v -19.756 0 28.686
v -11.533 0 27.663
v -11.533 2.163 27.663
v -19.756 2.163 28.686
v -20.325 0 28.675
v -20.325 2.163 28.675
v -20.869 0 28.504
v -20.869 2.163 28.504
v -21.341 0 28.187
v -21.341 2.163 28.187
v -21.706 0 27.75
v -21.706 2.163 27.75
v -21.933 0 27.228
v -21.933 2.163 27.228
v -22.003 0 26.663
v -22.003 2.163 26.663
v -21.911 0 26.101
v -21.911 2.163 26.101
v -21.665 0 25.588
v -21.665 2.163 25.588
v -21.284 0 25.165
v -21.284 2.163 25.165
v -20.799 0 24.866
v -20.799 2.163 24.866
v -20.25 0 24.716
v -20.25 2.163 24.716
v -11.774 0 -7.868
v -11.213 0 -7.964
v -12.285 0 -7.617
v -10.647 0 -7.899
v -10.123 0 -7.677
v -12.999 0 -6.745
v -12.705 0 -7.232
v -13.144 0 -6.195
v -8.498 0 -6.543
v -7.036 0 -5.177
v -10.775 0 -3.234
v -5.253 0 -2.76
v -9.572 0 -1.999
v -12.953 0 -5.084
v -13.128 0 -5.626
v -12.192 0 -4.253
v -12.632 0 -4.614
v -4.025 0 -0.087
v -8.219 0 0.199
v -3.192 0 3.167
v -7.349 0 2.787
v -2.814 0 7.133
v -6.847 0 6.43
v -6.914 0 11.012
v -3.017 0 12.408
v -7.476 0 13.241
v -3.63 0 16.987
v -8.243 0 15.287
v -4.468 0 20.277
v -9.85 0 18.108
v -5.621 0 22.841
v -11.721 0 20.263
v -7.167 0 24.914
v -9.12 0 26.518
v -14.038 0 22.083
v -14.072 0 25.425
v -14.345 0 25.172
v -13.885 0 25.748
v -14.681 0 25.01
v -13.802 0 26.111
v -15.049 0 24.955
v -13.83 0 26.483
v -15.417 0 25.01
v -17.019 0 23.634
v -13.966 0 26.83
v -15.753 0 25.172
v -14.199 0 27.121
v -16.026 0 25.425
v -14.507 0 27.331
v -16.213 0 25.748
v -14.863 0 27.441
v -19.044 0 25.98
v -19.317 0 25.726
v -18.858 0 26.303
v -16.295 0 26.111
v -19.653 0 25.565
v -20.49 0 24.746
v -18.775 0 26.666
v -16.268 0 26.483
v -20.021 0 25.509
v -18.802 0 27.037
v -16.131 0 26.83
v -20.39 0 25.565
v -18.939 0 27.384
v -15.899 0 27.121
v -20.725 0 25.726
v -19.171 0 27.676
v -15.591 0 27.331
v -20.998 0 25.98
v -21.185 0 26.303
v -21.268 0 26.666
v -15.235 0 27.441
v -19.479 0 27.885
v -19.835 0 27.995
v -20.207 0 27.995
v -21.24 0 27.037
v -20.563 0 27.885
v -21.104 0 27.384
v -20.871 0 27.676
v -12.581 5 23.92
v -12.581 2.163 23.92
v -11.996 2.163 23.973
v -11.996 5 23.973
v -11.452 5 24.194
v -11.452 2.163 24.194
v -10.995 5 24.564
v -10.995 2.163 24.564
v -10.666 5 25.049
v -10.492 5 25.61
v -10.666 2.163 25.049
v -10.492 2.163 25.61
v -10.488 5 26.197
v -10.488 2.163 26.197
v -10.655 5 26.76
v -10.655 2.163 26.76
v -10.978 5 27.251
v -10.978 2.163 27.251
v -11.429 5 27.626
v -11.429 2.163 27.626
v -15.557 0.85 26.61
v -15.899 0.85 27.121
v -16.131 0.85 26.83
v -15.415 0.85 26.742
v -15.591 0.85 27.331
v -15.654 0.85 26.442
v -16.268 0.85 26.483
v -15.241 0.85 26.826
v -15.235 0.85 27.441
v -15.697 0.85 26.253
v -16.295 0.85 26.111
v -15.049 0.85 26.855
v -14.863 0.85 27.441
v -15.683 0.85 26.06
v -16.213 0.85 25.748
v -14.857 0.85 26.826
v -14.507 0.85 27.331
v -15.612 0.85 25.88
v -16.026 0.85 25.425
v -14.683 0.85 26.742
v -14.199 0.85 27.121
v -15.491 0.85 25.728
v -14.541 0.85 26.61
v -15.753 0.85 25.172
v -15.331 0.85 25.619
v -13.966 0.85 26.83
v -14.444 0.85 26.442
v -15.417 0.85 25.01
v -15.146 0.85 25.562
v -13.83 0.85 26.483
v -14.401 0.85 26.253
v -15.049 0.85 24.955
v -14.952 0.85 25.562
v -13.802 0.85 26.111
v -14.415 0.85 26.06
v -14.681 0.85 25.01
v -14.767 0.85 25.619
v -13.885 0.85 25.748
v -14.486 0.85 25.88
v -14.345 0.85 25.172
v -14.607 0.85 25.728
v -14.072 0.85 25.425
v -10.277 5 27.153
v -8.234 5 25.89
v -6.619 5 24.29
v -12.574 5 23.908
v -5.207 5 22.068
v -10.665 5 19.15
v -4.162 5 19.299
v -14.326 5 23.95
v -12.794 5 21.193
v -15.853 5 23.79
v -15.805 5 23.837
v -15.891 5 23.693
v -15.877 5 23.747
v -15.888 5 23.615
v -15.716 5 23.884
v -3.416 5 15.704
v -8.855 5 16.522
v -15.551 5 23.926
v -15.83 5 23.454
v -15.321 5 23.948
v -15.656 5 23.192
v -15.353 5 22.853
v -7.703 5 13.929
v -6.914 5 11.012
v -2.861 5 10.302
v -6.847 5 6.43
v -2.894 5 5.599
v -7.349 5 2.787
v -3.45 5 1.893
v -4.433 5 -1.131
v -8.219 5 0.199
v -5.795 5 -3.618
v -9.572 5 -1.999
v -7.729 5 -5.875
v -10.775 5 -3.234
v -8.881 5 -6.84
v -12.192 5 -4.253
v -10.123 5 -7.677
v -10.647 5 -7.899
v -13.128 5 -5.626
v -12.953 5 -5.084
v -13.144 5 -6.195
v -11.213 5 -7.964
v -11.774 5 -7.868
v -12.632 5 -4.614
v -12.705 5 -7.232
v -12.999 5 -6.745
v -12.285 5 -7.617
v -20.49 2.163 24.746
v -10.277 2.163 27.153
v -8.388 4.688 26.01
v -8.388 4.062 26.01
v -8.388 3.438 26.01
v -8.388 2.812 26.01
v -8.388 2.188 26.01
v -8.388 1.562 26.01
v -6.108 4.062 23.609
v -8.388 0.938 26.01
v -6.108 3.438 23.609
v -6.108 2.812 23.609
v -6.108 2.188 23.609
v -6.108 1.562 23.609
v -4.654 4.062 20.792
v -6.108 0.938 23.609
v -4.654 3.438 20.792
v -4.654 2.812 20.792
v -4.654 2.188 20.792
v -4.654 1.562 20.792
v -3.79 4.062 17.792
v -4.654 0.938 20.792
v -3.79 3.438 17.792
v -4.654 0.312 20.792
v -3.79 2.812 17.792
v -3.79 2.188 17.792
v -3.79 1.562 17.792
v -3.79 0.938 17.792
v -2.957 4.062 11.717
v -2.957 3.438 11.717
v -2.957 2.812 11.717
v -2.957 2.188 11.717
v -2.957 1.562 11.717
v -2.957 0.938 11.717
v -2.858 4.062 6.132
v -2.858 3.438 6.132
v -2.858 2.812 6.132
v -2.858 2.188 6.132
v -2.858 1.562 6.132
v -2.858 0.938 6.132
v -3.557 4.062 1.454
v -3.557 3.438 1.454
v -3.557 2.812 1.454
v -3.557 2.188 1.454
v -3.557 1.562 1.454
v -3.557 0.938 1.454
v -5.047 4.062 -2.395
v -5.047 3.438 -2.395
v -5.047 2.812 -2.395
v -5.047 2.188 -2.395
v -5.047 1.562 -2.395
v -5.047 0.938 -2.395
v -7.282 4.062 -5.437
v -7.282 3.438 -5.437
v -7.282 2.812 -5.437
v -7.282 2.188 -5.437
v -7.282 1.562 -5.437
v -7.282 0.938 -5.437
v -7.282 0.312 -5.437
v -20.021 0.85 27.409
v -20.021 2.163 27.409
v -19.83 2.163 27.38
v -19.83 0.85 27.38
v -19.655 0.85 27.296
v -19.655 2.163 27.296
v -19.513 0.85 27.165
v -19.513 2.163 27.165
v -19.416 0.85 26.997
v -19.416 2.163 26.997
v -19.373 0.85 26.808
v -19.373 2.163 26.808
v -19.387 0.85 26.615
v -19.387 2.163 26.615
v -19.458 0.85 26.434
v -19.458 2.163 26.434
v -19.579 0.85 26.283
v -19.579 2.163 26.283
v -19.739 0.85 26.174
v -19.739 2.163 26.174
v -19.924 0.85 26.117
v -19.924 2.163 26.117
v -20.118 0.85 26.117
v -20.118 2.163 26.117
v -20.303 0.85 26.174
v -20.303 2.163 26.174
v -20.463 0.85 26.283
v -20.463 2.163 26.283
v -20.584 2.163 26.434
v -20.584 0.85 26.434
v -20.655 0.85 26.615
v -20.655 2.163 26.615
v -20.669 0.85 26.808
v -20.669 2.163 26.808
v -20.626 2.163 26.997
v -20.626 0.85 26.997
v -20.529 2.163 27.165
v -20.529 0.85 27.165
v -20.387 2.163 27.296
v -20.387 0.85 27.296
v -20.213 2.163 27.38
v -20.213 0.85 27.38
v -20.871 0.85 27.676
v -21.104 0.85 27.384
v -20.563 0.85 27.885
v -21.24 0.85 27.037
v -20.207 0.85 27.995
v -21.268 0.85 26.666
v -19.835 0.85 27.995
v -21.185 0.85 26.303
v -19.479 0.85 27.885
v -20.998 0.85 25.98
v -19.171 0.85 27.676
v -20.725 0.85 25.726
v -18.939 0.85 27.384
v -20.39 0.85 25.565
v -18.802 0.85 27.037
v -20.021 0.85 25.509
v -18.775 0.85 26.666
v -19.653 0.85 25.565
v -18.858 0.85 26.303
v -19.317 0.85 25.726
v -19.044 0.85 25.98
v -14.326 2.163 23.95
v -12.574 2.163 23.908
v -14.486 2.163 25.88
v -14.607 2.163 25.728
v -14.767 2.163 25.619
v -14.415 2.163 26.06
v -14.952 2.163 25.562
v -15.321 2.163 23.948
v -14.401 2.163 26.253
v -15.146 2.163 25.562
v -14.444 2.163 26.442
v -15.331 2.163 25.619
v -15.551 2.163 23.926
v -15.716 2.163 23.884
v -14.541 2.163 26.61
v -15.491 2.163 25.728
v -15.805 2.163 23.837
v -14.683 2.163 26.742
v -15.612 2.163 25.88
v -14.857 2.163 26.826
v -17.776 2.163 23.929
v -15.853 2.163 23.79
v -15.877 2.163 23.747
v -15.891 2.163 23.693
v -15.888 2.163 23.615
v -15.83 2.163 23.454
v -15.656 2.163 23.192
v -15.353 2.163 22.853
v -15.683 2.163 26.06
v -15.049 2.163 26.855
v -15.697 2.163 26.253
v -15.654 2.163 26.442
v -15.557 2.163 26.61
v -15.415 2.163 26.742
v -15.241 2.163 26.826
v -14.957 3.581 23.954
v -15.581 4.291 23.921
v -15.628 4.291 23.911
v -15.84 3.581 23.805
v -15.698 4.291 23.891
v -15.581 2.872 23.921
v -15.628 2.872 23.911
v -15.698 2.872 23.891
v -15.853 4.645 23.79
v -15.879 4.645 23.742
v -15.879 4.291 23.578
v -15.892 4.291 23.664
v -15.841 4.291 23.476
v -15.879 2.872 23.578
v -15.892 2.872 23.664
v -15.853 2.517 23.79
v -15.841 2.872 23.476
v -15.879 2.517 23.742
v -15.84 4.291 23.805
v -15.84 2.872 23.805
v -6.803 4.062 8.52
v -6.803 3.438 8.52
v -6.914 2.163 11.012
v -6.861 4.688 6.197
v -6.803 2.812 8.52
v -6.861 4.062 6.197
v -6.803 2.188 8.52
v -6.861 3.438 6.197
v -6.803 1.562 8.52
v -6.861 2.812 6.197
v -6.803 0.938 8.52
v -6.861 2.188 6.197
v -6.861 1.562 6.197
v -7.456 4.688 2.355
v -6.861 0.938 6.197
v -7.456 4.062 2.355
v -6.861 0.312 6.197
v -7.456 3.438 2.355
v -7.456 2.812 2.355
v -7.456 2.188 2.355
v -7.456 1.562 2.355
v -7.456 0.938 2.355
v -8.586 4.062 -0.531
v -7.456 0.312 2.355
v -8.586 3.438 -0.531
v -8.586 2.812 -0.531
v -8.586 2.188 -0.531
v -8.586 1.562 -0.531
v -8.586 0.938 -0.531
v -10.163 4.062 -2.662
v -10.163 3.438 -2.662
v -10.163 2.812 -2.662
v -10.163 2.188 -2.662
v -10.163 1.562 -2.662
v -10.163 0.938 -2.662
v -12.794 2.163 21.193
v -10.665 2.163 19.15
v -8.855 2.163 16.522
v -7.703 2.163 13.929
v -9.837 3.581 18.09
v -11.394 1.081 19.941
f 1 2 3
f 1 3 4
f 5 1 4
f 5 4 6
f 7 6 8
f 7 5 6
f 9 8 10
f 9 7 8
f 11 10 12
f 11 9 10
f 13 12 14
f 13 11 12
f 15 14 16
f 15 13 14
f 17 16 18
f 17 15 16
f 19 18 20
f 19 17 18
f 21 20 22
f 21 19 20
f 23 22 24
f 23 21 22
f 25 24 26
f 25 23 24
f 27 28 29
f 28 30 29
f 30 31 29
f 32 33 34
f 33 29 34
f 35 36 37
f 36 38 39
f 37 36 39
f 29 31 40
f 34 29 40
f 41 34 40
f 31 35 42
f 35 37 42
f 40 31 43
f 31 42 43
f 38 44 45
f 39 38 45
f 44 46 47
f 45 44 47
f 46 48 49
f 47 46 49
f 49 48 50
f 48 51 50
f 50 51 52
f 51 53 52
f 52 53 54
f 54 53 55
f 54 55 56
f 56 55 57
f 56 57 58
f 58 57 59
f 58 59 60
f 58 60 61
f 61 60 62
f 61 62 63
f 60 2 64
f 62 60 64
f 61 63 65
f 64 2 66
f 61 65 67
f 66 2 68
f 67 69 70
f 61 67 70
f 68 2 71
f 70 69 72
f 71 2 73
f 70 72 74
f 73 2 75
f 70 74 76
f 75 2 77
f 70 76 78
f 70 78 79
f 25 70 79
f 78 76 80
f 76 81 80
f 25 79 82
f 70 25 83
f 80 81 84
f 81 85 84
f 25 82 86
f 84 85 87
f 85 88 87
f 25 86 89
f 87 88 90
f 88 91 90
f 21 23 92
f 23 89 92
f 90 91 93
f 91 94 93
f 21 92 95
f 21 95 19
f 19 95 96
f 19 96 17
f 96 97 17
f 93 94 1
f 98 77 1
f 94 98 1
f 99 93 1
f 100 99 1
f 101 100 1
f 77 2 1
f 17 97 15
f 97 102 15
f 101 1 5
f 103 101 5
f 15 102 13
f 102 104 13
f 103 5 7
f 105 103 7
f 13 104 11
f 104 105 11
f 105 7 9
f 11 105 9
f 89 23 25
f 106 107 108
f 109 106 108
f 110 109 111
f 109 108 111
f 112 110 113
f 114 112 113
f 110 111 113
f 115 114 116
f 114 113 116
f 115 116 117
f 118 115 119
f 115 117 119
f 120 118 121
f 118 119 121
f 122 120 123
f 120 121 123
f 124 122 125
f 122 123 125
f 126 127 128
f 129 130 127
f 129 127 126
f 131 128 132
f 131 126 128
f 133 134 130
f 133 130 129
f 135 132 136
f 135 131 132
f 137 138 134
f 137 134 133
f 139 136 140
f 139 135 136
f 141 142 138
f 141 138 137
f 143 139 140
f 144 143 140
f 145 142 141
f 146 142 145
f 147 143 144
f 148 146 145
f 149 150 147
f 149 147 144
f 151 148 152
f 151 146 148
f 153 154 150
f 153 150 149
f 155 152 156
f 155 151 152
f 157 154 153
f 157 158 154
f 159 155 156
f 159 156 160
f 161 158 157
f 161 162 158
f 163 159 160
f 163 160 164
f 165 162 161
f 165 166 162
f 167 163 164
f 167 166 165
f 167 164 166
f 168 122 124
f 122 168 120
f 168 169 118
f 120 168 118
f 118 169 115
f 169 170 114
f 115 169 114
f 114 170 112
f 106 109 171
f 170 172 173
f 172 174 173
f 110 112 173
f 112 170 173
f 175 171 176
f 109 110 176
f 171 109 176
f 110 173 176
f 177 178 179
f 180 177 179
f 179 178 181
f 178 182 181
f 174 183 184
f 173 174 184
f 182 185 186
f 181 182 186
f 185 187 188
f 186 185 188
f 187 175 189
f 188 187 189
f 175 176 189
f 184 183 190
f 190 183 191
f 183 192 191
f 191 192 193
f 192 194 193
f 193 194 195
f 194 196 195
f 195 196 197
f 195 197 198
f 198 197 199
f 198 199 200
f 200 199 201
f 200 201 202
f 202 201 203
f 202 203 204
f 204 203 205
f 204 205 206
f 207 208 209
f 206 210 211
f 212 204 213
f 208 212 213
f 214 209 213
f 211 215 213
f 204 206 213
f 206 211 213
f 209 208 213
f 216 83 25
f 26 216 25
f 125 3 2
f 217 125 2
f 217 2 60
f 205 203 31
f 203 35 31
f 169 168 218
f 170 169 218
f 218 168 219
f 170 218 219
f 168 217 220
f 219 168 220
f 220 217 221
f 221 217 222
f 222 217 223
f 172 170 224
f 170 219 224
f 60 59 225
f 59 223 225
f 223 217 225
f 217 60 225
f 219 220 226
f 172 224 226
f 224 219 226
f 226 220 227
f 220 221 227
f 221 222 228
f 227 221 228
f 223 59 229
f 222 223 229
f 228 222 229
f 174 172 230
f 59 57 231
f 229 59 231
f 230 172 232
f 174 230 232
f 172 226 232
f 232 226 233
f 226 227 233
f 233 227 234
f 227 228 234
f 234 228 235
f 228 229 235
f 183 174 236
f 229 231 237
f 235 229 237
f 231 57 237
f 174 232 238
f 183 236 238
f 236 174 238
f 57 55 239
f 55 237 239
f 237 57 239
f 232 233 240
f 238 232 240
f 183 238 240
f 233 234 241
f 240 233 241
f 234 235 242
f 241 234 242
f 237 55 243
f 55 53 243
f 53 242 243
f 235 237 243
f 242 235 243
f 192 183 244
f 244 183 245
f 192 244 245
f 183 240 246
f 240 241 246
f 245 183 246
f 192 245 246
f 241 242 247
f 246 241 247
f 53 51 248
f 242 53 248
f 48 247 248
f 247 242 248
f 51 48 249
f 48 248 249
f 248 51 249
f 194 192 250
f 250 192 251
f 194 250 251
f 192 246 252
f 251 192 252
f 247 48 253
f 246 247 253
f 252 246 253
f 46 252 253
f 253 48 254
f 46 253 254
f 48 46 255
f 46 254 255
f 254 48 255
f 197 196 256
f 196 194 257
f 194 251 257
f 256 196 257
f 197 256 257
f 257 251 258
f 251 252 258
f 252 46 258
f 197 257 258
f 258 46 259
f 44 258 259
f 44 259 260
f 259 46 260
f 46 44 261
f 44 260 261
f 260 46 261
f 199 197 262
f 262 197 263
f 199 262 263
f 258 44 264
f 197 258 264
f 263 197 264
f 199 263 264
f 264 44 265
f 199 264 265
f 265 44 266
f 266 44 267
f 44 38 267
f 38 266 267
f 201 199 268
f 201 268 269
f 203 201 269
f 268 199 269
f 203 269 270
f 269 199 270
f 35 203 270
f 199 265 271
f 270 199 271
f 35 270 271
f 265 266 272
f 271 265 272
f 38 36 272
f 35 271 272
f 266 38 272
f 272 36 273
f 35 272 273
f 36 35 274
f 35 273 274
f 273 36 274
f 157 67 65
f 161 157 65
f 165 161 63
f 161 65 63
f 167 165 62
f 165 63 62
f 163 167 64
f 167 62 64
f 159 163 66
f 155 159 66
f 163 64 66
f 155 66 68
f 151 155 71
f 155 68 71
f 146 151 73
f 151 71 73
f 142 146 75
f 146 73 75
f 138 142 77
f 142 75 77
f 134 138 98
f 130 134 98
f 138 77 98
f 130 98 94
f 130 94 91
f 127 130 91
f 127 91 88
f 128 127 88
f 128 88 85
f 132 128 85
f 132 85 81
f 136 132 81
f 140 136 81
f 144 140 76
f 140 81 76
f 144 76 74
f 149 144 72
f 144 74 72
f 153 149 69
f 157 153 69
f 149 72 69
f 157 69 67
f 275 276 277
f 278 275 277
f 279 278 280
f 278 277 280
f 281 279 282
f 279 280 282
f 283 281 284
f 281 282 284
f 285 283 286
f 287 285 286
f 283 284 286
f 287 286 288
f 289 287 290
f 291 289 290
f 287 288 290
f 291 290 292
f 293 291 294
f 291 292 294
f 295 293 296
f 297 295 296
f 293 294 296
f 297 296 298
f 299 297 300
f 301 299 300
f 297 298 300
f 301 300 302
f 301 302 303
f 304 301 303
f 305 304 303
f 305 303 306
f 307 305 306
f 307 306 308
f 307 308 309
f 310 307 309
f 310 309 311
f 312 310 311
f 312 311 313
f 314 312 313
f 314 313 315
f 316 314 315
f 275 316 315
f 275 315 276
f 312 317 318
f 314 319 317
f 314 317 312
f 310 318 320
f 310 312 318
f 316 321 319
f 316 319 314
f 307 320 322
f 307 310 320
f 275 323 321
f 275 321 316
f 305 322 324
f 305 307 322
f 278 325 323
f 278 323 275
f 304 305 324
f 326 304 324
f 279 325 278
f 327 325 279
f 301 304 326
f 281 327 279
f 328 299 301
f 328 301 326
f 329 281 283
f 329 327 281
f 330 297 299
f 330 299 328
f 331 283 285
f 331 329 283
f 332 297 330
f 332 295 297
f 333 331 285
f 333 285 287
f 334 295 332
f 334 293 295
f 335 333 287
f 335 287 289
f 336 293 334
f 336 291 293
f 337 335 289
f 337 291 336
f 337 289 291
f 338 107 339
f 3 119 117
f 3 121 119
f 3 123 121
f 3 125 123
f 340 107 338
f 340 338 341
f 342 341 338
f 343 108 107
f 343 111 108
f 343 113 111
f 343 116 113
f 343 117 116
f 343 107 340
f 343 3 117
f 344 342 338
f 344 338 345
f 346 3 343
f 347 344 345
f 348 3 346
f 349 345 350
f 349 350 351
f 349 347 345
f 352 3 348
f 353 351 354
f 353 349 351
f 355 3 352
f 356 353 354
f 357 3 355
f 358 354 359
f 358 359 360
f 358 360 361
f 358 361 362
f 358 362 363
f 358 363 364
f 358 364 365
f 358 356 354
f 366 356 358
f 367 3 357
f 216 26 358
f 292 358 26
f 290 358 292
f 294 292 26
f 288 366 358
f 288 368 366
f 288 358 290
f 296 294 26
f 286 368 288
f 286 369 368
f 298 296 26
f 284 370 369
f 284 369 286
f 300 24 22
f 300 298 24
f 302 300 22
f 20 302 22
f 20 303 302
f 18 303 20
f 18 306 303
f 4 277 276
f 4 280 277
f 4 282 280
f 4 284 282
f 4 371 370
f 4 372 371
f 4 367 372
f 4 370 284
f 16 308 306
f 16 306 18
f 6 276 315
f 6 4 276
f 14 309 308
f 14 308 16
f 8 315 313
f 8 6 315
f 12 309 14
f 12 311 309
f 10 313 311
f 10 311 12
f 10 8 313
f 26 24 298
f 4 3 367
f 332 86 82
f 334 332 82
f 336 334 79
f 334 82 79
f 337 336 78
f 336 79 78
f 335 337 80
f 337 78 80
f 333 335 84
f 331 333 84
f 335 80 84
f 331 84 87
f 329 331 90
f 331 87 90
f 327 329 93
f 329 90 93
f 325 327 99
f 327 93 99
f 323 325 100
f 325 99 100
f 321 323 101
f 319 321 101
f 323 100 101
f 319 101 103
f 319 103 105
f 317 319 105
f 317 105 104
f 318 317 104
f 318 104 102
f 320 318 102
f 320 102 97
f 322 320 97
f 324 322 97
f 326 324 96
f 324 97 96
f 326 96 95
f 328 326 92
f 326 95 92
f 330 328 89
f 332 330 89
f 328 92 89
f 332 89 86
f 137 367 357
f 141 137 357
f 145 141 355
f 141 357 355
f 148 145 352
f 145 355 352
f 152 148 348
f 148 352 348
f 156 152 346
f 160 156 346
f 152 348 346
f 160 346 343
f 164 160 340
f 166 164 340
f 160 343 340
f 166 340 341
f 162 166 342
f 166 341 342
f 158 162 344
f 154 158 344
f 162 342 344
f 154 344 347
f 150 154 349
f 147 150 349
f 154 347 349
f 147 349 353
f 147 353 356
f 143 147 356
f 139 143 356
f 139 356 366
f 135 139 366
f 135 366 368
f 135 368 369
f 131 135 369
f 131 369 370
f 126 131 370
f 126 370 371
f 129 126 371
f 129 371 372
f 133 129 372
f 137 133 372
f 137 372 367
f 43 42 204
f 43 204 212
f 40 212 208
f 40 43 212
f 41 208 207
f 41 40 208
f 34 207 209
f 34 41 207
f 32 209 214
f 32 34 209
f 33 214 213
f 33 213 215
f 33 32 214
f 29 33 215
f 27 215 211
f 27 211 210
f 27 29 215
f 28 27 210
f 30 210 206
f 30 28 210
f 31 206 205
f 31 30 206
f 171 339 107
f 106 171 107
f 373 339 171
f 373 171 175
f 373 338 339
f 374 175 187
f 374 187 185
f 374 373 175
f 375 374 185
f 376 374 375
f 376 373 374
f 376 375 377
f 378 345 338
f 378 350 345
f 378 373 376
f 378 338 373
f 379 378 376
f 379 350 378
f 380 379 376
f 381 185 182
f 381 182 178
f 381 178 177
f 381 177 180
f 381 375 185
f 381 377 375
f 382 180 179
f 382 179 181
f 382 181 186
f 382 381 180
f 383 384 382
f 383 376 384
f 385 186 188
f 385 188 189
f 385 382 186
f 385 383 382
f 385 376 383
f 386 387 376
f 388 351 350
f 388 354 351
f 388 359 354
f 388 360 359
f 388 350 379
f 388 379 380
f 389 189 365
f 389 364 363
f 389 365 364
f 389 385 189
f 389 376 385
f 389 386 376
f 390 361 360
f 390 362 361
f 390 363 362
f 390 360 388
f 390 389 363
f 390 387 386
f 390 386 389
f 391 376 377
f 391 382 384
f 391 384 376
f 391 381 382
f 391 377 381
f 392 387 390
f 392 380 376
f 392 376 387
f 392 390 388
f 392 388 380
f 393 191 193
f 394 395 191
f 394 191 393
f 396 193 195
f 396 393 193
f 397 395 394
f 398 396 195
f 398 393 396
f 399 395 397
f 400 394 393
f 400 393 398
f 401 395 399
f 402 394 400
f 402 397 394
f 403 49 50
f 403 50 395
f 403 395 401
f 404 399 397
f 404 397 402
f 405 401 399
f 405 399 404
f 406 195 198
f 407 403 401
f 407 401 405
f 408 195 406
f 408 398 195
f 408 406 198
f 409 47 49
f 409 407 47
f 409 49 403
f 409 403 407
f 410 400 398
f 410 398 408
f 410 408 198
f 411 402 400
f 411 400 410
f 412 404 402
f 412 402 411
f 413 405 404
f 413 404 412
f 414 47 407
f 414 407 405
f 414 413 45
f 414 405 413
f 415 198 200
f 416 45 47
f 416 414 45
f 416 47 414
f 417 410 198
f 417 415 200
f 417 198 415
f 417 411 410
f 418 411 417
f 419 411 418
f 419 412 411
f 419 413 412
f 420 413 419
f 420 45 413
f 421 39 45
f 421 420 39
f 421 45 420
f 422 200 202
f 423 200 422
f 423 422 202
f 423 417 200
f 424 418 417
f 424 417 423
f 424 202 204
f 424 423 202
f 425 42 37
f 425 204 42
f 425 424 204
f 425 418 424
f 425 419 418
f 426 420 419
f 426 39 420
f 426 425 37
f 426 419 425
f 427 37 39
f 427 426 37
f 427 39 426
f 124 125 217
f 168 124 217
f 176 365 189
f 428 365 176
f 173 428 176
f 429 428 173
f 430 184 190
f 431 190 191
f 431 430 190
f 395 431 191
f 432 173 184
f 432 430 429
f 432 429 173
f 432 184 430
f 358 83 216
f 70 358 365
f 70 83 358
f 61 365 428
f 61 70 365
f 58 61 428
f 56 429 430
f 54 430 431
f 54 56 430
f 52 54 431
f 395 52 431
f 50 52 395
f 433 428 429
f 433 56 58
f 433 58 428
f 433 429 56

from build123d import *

# Parameters (mm, degrees)
EXTRUDE_1_DEPTH     = 5
CUT_EXTRUDE_3_DEPTH = 36.932997264
SKETCH_6_R          = 0.65
CUT_EXTRUDE_4_DEPTH = 37.508731303
SKETCH_7_R          = 1.25
CUT_EXTRUDE_5_DEPTH = 0.85
EXTRUDE_2_DEPTH     = 2.837273549
EXTRUDE_3_DEPTH     = 2.162726451
EXTRUDE_4_DEPTH     = 2.837273549


with BuildPart() as part:
    # 草图1 → 凸台-拉伸1 (new body)
    with BuildSketch(Plane(origin=(0, 0, 0), x_dir=(1, 0, 0), z_dir=(0, 1, 0))):
        with BuildLine():
            Line((-11.532787565, -27.66331715), (-19.756338957, -28.685777545))
            ThreePointArc((-19.756338957, -28.685777545), (-21.987823516, -26.947825687), (-20.249871658, -24.716341127))
            Line((-20.249871658, -24.716341127), (-12.48156417, -23.75048266))
            add(Edge.make_bspline(
                [(-12.48156417, -23.75048266), (-12.295612378, -23.67796581), (-11.920949946, -23.514760542), (-11.264517505, -23.162027697), (-10.551390656, -22.655406839), (-9.837584569, -21.94614323), (-9.026907466, -20.848225864), (-8.238987931, -19.16416179), (-7.602196611, -16.706089731), (-7.189047715, -13.934273469), (-6.893621745, -11.087804415), (-6.772952472, -8.470611277), (-6.854171877, -5.379387305), (-7.367845034, -2.192874406), (-8.514649439, 0.65647794), (-9.829040758, 2.401950035), (-11.094940182, 3.531874214), (-11.819819389, 4.028598999), (-12.191592735, 4.253212063)],
                knots=[0.005238239, 0.005238239, 0.005238239, 0.005238239, 0.020781392, 0.036324544, 0.067410849, 0.098497154, 0.129583459, 0.191756069, 0.253928679, 0.316101289, 0.3782739, 0.44044651, 0.50261912, 0.62696434, 0.75130956, 0.87565478, 0.93782739, 1, 1, 1, 1], degree=3))
            ThreePointArc((-12.191592735, 4.253212063), (-12.869192539, 6.999274426), (-10.123130176, 7.67687423))
            add(Edge.make_bspline(
                [(-11.532787565, -27.66331715), (-11.470532884, -27.640873613), (-11.355102626, -27.59953383), (-11.051609278, -27.488475951), (-10.551343717, -27.286553928), (-9.584901148, -26.829408766), (-7.854575968, -25.725812711), (-5.96542891, -23.675110376), (-4.556446234, -20.819990637), (-3.731942919, -17.796654668), (-3.257587757, -14.742999785), (-2.927918963, -11.698935156), (-2.772480823, -8.76409887), (-2.841981487, -5.204938932), (-3.425083428, -1.318171114), (-4.918570201, 2.52848265), (-7.182233346, 5.575301279), (-9.090959394, 7.05327105), (-10.123130176, 7.67687423)],
                knots=[-0.004411621, -0.004411621, -0.004411621, -0.004411621, -0.000488138, 0.003435345, 0.011282311, 0.026976242, 0.058364105, 0.121139832, 0.183915558, 0.246691284, 0.309467011, 0.372242737, 0.435018463, 0.49779419, 0.623345642, 0.748897095, 0.874448547, 1, 1, 1, 1], degree=3))
        make_face()
    extrude(amount=EXTRUDE_1_DEPTH)

    # 草图5 → 切除-拉伸3 (cut, through all)
    with BuildSketch(Plane.XY.offset(20)):
        Polygon((-22.003105308, 4.162726451), (-22.003105308, 5), (-10.276836703, 5), (-10.276836703, 4.162726451), (-10.276836703, 2.162726451), (-22.003105308, 2.162726451), align=None)
    extrude(amount=CUT_EXTRUDE_3_DEPTH, mode=Mode.SUBTRACT)

    # 草图6 → 切除-拉伸4 (cut, through all)
    with BuildSketch(Plane(origin=(0, 5, 0), x_dir=(1, 0, 0), z_dir=(0, 1, 0))):
        with Locations(Location((-20.021110813, -26.759262863, 0), (0, 0, 270))):
            Circle(SKETCH_6_R)
        with Locations(Location((-15.048958849, -26.204756434, 0), (0, 0, 270))):
            Circle(SKETCH_6_R)
    extrude(amount=-CUT_EXTRUDE_4_DEPTH, mode=Mode.SUBTRACT)

    # 草图7 → 切除-拉伸5 (cut)
    with BuildSketch(Plane.XZ):
        with Locations(Location((-20.021110813, 26.759262863, 0), (0, 0, 270))):
            Circle(SKETCH_7_R)
        with Locations(Location((-15.048958849, 26.204756434, 0), (0, 0, 270))):
            Circle(SKETCH_7_R)
    extrude(amount=-CUT_EXTRUDE_5_DEPTH, mode=Mode.SUBTRACT)

    # 草图8 → 凸台-拉伸2 (add)
    with BuildSketch(Plane(origin=(0, 2.162726451, 0), x_dir=(1, 0, 0), z_dir=(0, 1, 0))):
        with BuildLine():
            Line((-12.48156417, -23.75048266), (-12.580826815, -23.920103142))
            ThreePointArc((-12.580826815, -23.920103142), (-10.558019351, -25.323434722), (-11.429255903, -27.626049851))
            add(Edge.make_bspline(
                [(-11.429255903, -27.626049851), (-11.402483913, -27.616408571), (-11.312274879, -27.583861794), (-11.051609278, -27.488475951), (-10.694139024, -27.344190351), (-10.414634593, -27.218588376), (-10.276836703, -27.153356774)],
                knots=[-0.002196957, -0.002196957, -0.002196957, -0.002196957, -0.000488138, 0.003435345, 0.011282311, 0.019136837, 0.019136837, 0.019136837, 0.019136837], degree=3))
            Line((-10.276836703, -27.153356774), (-10.276836703, -22.371362309))
            add(Edge.make_bspline(
                [(-10.276836703, -22.371362309), (-10.372821557, -22.463117226), (-10.724386033, -22.778306526), (-11.264517505, -23.162027697), (-11.920949946, -23.514760542), (-12.295612378, -23.67796581), (-12.48156417, -23.75048266)],
                knots=[0.925593927, 0.925593927, 0.925593927, 0.925593927, 0.93782739, 0.968913695, 0.984456847, 1, 1, 1, 1], degree=3))
        make_face()
    extrude(amount=EXTRUDE_2_DEPTH)

    # 草图9 → 凸台-拉伸3 (add)
    with BuildSketch(Plane.XZ):
        with BuildLine():
            Line((-20.489918003, 24.746186856), (-12.48156417, 23.75048266))
            add(Edge.make_bspline(
                [(-12.48156417, 23.75048266), (-12.295612378, 23.67796581), (-11.920949946, 23.514760542), (-11.264517505, 23.162027697), (-10.551390656, 22.655406839), (-9.837584569, 21.94614323), (-9.026907466, 20.848225864), (-8.238987931, 19.16416179), (-7.602196611, 16.706089731), (-7.189047715, 13.934273469), (-6.987988897, 11.997044646), (-6.917012362, 11.050106293), (-6.91422073, 11.012251503)],
                knots=[0.005238239, 0.005238239, 0.005238239, 0.005238239, 0.020781392, 0.036324544, 0.067410849, 0.098497154, 0.129583459, 0.191756069, 0.253928679, 0.316101289, 0.3782739, 0.380867603, 0.380867603, 0.380867603, 0.380867603], degree=3))
            add(Edge.make_bspline(
                [(-20.489918003, 24.746186856), (-9.085568026, 22.00342521), (-6.91422073, 11.012251503)],
                knots=[0, 0, 0, 1, 1, 1], degree=2))
        make_face()
    extrude(amount=-EXTRUDE_3_DEPTH)

    # 草图10 → 凸台-拉伸4 (add)
    with BuildSketch(Plane(origin=(0, 2.162726451, 0), x_dir=(1, 0, 0), z_dir=(0, 1, 0))):
        with BuildLine():
            Line((-12.48156417, -23.75048266), (-12.573747328, -23.90800568))
            add(Edge.make_bspline(
                [(-12.573747328, -23.90800568), (-13.049488997, -23.93391524), (-14.700965999, -23.963867562), (-16.426938548, -23.94912182), (-15.35263855, -22.852847317)],
                knots=[0, 0, 0, 0, 0.570111163, 1, 1, 1, 1], degree=3))
            add(Edge.make_bspline(
                [(-15.35263855, -22.852847317), (-8.541278489, -19.248278275), (-6.91422073, -11.012251503)],
                knots=[0, 0, 0, 1, 1, 1], degree=2))
            add(Edge.make_bspline(
                [(-6.91422073, -11.012251503), (-6.917012362, -11.050106293), (-6.987988897, -11.997044646), (-7.189047715, -13.934273469), (-7.602196611, -16.706089731), (-8.238987931, -19.16416179), (-9.026907466, -20.848225864), (-9.837584569, -21.94614323), (-10.551390656, -22.655406839), (-11.264517505, -23.162027697), (-11.920949946, -23.514760542), (-12.295612378, -23.67796581), (-12.48156417, -23.75048266)],
                knots=[0.624370637, 0.624370637, 0.624370637, 0.624370637, 0.62696434, 0.68913695, 0.75130956, 0.81348217, 0.87565478, 0.906741085, 0.93782739, 0.968913695, 0.984456847, 1, 1, 1, 1], degree=3))
        make_face()
    extrude(amount=EXTRUDE_4_DEPTH)


solid = part.part
